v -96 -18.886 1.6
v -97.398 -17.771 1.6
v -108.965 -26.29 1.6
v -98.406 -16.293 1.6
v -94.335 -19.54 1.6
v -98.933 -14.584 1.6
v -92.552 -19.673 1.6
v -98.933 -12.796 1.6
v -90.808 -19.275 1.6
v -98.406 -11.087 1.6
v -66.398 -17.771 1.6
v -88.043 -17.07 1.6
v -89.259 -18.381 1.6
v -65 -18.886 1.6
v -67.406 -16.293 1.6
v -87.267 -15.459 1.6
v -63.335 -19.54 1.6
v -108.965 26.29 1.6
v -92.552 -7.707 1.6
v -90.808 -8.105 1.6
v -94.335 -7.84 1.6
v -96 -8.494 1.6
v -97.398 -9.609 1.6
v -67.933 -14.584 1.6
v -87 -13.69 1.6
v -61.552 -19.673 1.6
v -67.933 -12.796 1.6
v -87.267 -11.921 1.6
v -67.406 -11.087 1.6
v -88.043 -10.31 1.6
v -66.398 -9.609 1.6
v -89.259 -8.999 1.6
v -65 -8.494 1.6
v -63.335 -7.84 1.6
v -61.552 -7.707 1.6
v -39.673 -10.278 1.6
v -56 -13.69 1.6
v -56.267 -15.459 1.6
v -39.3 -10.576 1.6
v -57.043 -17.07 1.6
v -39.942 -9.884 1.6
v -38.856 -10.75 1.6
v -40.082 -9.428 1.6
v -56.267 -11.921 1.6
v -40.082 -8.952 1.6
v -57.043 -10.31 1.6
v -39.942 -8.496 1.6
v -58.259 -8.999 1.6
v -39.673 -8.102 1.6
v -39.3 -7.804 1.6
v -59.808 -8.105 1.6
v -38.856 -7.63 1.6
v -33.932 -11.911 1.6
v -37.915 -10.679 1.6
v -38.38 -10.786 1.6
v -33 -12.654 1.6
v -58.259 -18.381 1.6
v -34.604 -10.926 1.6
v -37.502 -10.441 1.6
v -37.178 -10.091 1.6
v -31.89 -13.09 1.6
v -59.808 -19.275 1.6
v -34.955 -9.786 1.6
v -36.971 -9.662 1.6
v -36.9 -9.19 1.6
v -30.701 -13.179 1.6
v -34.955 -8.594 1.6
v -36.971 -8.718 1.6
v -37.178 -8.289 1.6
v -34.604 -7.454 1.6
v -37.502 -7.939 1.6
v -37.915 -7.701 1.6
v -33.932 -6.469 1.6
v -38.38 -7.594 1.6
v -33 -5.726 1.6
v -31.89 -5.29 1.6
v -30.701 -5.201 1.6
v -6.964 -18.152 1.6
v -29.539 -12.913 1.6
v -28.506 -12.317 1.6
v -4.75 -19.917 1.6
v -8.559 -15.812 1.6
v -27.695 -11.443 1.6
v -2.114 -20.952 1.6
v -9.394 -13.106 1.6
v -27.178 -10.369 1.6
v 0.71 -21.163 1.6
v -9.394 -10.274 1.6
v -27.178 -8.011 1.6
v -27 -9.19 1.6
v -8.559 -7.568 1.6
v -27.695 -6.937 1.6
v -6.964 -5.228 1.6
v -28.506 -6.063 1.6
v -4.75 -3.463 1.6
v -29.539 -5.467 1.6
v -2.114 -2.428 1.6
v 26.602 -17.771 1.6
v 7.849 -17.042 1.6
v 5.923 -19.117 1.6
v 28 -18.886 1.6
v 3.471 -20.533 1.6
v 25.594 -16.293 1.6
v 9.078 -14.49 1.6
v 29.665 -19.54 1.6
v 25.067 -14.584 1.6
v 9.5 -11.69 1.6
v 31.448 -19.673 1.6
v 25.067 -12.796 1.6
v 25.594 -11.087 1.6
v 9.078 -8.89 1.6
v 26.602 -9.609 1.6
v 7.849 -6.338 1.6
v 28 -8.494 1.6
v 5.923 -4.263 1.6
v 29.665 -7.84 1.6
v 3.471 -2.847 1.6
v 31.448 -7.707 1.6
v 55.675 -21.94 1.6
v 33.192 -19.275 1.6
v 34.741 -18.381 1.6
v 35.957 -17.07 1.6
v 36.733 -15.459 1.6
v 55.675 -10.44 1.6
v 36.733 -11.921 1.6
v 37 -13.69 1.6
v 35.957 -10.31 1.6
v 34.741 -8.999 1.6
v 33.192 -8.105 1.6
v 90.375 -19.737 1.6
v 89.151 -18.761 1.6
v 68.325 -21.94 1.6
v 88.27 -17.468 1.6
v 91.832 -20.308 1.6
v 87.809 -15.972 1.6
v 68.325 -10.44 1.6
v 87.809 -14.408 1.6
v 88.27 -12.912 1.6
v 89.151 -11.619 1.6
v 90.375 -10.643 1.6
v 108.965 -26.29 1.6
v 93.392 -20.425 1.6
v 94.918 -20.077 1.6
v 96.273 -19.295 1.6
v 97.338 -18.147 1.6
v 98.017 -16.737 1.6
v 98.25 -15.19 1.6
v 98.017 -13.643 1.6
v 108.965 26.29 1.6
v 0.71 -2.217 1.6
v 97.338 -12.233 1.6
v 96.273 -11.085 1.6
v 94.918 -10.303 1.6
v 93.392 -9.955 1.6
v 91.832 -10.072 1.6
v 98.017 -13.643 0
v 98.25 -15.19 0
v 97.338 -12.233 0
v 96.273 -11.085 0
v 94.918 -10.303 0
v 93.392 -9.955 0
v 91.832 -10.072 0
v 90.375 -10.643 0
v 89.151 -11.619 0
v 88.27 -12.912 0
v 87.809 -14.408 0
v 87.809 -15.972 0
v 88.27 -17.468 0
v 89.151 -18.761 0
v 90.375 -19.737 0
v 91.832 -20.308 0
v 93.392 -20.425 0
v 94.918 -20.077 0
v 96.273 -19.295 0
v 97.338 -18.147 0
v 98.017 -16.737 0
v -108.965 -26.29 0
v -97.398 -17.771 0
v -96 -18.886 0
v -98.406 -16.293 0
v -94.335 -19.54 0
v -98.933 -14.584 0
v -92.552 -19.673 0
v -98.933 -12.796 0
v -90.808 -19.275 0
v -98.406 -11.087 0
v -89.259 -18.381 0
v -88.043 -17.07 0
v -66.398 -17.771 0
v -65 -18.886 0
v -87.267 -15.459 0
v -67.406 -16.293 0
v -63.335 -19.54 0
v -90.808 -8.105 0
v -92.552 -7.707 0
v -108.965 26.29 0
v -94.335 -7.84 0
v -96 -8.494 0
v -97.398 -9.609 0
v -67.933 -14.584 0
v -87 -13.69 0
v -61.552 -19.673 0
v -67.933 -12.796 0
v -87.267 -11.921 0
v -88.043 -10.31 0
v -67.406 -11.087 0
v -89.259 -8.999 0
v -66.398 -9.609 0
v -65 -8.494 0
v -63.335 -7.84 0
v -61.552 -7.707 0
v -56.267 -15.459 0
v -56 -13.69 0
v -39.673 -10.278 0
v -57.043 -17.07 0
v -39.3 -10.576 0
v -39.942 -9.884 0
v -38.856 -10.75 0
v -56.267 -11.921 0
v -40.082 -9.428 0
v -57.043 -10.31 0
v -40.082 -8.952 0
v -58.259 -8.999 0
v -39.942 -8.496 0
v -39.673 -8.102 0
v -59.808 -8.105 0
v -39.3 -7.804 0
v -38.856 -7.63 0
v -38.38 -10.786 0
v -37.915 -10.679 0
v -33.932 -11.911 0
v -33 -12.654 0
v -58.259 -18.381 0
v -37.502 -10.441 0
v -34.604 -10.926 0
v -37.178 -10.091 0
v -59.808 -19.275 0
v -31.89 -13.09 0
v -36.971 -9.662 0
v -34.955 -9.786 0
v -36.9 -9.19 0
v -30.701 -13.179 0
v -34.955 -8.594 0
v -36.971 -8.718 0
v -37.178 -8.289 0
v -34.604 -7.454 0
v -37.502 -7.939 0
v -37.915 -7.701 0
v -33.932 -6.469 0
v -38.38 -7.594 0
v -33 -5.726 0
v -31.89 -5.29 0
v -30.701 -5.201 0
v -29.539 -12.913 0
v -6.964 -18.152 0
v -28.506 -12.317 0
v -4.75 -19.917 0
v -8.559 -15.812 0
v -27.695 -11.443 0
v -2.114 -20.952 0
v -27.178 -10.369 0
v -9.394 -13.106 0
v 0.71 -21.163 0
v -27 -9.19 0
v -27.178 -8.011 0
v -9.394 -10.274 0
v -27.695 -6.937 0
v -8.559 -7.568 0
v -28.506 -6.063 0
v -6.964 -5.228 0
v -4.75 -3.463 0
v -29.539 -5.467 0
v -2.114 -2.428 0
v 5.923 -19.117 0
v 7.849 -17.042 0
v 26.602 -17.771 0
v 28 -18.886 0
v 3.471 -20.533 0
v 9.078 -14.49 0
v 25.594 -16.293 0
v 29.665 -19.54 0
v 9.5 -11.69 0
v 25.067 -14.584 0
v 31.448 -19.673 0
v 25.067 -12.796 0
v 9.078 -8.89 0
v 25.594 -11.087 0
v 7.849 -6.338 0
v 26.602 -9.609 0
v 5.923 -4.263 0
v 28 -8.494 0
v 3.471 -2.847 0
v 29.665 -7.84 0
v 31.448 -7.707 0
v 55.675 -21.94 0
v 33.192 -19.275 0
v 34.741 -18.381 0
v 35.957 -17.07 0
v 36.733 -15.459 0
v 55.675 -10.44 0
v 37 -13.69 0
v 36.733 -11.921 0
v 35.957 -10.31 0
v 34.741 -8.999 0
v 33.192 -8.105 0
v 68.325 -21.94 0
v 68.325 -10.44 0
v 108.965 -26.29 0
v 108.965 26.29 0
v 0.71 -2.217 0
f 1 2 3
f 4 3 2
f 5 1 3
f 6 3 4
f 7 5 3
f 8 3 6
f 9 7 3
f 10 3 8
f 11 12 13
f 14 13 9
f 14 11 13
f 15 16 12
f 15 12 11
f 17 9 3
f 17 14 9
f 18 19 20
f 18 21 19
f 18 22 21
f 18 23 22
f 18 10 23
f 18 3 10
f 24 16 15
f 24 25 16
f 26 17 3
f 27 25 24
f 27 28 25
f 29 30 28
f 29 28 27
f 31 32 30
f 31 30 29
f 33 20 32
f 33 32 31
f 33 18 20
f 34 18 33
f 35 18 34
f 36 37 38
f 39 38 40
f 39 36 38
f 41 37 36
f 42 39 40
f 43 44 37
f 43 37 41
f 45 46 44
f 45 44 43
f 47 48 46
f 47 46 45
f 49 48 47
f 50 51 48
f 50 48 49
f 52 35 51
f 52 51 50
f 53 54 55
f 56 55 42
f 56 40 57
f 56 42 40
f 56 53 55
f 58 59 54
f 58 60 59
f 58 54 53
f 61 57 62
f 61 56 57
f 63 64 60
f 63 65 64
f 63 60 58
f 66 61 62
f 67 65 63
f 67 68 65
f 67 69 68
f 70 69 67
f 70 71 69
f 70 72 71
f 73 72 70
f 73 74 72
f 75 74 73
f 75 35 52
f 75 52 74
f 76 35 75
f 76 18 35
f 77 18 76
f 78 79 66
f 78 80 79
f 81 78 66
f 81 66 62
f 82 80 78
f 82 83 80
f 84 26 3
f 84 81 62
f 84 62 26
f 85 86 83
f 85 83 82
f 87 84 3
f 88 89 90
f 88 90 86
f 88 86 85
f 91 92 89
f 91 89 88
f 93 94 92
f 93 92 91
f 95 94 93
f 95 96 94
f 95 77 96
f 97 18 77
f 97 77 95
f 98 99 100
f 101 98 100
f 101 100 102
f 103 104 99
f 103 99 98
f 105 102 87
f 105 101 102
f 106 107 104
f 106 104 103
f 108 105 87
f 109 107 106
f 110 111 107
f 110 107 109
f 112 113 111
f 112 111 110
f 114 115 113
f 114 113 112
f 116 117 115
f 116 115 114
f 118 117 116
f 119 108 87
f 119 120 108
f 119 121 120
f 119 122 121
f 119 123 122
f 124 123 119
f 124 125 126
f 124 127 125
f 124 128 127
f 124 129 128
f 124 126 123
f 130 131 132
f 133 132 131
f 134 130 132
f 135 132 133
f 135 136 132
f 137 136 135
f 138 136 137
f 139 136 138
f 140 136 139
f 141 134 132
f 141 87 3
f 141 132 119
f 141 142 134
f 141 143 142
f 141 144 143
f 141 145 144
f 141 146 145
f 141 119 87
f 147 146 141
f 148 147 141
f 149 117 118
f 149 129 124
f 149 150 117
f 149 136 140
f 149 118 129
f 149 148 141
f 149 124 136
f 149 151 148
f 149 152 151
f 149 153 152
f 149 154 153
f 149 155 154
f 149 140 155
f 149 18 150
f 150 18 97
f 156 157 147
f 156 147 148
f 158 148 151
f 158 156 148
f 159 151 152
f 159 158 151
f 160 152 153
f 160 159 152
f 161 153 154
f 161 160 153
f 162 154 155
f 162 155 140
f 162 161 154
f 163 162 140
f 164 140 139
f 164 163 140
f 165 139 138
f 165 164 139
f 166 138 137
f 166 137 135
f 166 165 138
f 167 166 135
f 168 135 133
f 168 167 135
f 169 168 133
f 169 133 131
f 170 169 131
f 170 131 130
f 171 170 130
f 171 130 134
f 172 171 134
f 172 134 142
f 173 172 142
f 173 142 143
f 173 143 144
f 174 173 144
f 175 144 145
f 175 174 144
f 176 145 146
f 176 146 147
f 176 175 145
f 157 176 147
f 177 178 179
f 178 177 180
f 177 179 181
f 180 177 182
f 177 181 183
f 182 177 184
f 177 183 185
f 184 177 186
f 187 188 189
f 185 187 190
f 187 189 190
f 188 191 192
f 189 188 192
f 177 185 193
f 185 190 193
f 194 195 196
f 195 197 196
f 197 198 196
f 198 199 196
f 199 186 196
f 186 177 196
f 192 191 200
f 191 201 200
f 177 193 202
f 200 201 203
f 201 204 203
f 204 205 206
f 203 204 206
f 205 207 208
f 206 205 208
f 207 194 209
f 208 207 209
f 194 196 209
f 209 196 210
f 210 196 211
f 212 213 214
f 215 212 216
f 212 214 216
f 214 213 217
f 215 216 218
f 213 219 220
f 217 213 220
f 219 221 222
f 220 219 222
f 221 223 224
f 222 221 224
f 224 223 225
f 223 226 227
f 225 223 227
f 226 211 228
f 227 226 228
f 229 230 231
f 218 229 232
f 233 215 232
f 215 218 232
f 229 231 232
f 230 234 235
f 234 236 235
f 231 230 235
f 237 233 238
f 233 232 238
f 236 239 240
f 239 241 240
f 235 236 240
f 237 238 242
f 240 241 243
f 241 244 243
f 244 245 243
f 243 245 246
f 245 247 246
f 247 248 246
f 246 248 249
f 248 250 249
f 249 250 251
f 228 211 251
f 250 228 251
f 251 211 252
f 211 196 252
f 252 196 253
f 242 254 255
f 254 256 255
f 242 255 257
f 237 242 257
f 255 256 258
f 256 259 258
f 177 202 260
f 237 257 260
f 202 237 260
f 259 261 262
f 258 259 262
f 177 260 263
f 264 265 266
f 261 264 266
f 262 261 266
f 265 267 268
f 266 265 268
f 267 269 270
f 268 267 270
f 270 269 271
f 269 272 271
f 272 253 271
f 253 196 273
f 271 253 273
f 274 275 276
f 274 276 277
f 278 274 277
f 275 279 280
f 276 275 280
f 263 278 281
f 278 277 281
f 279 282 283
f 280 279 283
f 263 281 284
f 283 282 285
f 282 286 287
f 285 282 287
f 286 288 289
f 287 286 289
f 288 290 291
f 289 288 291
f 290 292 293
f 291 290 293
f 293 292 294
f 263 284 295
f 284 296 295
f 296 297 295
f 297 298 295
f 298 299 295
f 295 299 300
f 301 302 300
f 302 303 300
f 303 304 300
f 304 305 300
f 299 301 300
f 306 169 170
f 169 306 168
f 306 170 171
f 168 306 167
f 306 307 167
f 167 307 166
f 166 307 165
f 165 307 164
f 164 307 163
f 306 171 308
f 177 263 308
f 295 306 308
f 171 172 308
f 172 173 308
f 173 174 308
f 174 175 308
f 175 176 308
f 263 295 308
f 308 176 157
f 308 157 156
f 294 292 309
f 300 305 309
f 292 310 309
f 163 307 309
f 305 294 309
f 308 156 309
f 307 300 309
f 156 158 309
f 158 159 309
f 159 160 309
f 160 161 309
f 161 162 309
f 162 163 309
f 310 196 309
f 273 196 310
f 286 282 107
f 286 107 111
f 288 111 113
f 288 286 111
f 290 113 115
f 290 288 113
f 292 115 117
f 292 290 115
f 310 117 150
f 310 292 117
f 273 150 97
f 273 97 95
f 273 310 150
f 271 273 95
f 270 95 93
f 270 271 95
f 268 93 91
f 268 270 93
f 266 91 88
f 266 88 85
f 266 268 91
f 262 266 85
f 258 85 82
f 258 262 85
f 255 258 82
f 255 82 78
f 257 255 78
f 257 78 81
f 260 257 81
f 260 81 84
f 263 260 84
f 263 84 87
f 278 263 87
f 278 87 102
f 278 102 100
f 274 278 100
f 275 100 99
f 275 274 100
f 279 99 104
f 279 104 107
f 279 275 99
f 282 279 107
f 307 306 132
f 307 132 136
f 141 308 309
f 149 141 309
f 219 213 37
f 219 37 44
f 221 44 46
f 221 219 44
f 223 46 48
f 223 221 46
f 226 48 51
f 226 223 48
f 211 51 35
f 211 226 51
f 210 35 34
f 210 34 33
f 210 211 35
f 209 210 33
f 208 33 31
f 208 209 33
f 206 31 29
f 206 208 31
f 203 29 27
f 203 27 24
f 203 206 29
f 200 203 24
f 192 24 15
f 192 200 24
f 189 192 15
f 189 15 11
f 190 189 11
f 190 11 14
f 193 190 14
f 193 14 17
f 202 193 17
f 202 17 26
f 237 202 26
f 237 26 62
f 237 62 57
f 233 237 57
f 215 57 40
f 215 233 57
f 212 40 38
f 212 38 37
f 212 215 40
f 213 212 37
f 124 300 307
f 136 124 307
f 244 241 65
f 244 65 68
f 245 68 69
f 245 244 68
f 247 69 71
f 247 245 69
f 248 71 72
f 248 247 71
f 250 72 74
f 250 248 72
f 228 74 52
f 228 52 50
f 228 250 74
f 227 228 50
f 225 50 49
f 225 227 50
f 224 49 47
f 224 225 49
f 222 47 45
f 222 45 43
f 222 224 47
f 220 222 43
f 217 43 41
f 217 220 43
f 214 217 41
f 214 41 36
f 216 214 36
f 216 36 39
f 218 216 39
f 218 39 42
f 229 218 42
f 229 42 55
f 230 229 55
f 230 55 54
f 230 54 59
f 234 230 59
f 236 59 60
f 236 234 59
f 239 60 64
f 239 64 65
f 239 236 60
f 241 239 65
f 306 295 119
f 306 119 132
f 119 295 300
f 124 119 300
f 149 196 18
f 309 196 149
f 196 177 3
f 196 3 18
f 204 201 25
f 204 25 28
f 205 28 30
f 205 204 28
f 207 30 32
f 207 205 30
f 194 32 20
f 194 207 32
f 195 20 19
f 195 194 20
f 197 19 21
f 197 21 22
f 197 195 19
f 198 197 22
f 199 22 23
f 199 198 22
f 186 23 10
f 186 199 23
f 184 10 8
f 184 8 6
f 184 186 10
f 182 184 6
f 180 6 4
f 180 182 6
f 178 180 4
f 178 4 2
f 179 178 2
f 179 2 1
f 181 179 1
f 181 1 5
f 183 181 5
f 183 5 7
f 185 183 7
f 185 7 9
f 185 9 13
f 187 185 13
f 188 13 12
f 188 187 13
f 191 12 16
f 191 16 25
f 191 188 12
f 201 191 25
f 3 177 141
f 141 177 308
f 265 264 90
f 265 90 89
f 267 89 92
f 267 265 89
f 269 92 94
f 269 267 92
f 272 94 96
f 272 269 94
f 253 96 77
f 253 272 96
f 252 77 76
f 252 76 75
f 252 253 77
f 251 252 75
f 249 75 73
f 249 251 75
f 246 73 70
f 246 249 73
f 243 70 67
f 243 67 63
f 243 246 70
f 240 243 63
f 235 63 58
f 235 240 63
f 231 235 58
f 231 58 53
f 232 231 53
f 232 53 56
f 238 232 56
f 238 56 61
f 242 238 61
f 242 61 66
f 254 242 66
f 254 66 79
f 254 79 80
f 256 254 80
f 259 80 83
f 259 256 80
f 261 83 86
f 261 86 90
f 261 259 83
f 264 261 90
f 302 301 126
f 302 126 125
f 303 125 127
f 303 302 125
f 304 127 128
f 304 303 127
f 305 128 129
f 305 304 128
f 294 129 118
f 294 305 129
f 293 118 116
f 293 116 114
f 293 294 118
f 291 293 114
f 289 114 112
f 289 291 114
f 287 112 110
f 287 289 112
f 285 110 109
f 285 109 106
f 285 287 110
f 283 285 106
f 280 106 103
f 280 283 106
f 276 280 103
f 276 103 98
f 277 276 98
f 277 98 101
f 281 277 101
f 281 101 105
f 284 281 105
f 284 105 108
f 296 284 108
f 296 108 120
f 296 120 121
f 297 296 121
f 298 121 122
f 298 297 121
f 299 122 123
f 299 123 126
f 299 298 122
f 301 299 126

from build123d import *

# Parameters (mm, degrees)
SKETCH_W   = 217.93
SKETCH_H   = 52.58
SKETCH_R   = 6
SKETCH_R_2 = 4
SKETCH_R_3 = 1.6
SKETCH_R_4 = 9.5
SKETCH_R_5 = 5.25
SKETCH_W_2 = 12.65
SKETCH_H_2 = 11.5
PAD_DEPTH  = 1.6


with BuildPart() as part:
    # Sketch → Pad (new body)
    with BuildSketch(Plane.XY):
        Rectangle(SKETCH_W, SKETCH_H)
        with Locations((-93, -13.69)):
            Circle(SKETCH_R, mode=Mode.SUBTRACT)
        with Locations((-62, -13.69)):
            Circle(SKETCH_R, mode=Mode.SUBTRACT)
        with Locations((31, -13.69)):
            Circle(SKETCH_R, mode=Mode.SUBTRACT)
        with Locations((-31, -9.19)):
            Circle(SKETCH_R_2, mode=Mode.SUBTRACT)
        with Locations((-38.5, -9.19)):
            Circle(SKETCH_R_3, mode=Mode.SUBTRACT)
        with Locations((0, -11.69)):
            Circle(SKETCH_R_4, mode=Mode.SUBTRACT)
        with Locations((93, -15.19)):
            Circle(SKETCH_R_5, mode=Mode.SUBTRACT)
        with Locations((62, -16.19)):
            Rectangle(SKETCH_W_2, SKETCH_H_2, mode=Mode.SUBTRACT)
    extrude(amount=PAD_DEPTH)


solid = part.part
